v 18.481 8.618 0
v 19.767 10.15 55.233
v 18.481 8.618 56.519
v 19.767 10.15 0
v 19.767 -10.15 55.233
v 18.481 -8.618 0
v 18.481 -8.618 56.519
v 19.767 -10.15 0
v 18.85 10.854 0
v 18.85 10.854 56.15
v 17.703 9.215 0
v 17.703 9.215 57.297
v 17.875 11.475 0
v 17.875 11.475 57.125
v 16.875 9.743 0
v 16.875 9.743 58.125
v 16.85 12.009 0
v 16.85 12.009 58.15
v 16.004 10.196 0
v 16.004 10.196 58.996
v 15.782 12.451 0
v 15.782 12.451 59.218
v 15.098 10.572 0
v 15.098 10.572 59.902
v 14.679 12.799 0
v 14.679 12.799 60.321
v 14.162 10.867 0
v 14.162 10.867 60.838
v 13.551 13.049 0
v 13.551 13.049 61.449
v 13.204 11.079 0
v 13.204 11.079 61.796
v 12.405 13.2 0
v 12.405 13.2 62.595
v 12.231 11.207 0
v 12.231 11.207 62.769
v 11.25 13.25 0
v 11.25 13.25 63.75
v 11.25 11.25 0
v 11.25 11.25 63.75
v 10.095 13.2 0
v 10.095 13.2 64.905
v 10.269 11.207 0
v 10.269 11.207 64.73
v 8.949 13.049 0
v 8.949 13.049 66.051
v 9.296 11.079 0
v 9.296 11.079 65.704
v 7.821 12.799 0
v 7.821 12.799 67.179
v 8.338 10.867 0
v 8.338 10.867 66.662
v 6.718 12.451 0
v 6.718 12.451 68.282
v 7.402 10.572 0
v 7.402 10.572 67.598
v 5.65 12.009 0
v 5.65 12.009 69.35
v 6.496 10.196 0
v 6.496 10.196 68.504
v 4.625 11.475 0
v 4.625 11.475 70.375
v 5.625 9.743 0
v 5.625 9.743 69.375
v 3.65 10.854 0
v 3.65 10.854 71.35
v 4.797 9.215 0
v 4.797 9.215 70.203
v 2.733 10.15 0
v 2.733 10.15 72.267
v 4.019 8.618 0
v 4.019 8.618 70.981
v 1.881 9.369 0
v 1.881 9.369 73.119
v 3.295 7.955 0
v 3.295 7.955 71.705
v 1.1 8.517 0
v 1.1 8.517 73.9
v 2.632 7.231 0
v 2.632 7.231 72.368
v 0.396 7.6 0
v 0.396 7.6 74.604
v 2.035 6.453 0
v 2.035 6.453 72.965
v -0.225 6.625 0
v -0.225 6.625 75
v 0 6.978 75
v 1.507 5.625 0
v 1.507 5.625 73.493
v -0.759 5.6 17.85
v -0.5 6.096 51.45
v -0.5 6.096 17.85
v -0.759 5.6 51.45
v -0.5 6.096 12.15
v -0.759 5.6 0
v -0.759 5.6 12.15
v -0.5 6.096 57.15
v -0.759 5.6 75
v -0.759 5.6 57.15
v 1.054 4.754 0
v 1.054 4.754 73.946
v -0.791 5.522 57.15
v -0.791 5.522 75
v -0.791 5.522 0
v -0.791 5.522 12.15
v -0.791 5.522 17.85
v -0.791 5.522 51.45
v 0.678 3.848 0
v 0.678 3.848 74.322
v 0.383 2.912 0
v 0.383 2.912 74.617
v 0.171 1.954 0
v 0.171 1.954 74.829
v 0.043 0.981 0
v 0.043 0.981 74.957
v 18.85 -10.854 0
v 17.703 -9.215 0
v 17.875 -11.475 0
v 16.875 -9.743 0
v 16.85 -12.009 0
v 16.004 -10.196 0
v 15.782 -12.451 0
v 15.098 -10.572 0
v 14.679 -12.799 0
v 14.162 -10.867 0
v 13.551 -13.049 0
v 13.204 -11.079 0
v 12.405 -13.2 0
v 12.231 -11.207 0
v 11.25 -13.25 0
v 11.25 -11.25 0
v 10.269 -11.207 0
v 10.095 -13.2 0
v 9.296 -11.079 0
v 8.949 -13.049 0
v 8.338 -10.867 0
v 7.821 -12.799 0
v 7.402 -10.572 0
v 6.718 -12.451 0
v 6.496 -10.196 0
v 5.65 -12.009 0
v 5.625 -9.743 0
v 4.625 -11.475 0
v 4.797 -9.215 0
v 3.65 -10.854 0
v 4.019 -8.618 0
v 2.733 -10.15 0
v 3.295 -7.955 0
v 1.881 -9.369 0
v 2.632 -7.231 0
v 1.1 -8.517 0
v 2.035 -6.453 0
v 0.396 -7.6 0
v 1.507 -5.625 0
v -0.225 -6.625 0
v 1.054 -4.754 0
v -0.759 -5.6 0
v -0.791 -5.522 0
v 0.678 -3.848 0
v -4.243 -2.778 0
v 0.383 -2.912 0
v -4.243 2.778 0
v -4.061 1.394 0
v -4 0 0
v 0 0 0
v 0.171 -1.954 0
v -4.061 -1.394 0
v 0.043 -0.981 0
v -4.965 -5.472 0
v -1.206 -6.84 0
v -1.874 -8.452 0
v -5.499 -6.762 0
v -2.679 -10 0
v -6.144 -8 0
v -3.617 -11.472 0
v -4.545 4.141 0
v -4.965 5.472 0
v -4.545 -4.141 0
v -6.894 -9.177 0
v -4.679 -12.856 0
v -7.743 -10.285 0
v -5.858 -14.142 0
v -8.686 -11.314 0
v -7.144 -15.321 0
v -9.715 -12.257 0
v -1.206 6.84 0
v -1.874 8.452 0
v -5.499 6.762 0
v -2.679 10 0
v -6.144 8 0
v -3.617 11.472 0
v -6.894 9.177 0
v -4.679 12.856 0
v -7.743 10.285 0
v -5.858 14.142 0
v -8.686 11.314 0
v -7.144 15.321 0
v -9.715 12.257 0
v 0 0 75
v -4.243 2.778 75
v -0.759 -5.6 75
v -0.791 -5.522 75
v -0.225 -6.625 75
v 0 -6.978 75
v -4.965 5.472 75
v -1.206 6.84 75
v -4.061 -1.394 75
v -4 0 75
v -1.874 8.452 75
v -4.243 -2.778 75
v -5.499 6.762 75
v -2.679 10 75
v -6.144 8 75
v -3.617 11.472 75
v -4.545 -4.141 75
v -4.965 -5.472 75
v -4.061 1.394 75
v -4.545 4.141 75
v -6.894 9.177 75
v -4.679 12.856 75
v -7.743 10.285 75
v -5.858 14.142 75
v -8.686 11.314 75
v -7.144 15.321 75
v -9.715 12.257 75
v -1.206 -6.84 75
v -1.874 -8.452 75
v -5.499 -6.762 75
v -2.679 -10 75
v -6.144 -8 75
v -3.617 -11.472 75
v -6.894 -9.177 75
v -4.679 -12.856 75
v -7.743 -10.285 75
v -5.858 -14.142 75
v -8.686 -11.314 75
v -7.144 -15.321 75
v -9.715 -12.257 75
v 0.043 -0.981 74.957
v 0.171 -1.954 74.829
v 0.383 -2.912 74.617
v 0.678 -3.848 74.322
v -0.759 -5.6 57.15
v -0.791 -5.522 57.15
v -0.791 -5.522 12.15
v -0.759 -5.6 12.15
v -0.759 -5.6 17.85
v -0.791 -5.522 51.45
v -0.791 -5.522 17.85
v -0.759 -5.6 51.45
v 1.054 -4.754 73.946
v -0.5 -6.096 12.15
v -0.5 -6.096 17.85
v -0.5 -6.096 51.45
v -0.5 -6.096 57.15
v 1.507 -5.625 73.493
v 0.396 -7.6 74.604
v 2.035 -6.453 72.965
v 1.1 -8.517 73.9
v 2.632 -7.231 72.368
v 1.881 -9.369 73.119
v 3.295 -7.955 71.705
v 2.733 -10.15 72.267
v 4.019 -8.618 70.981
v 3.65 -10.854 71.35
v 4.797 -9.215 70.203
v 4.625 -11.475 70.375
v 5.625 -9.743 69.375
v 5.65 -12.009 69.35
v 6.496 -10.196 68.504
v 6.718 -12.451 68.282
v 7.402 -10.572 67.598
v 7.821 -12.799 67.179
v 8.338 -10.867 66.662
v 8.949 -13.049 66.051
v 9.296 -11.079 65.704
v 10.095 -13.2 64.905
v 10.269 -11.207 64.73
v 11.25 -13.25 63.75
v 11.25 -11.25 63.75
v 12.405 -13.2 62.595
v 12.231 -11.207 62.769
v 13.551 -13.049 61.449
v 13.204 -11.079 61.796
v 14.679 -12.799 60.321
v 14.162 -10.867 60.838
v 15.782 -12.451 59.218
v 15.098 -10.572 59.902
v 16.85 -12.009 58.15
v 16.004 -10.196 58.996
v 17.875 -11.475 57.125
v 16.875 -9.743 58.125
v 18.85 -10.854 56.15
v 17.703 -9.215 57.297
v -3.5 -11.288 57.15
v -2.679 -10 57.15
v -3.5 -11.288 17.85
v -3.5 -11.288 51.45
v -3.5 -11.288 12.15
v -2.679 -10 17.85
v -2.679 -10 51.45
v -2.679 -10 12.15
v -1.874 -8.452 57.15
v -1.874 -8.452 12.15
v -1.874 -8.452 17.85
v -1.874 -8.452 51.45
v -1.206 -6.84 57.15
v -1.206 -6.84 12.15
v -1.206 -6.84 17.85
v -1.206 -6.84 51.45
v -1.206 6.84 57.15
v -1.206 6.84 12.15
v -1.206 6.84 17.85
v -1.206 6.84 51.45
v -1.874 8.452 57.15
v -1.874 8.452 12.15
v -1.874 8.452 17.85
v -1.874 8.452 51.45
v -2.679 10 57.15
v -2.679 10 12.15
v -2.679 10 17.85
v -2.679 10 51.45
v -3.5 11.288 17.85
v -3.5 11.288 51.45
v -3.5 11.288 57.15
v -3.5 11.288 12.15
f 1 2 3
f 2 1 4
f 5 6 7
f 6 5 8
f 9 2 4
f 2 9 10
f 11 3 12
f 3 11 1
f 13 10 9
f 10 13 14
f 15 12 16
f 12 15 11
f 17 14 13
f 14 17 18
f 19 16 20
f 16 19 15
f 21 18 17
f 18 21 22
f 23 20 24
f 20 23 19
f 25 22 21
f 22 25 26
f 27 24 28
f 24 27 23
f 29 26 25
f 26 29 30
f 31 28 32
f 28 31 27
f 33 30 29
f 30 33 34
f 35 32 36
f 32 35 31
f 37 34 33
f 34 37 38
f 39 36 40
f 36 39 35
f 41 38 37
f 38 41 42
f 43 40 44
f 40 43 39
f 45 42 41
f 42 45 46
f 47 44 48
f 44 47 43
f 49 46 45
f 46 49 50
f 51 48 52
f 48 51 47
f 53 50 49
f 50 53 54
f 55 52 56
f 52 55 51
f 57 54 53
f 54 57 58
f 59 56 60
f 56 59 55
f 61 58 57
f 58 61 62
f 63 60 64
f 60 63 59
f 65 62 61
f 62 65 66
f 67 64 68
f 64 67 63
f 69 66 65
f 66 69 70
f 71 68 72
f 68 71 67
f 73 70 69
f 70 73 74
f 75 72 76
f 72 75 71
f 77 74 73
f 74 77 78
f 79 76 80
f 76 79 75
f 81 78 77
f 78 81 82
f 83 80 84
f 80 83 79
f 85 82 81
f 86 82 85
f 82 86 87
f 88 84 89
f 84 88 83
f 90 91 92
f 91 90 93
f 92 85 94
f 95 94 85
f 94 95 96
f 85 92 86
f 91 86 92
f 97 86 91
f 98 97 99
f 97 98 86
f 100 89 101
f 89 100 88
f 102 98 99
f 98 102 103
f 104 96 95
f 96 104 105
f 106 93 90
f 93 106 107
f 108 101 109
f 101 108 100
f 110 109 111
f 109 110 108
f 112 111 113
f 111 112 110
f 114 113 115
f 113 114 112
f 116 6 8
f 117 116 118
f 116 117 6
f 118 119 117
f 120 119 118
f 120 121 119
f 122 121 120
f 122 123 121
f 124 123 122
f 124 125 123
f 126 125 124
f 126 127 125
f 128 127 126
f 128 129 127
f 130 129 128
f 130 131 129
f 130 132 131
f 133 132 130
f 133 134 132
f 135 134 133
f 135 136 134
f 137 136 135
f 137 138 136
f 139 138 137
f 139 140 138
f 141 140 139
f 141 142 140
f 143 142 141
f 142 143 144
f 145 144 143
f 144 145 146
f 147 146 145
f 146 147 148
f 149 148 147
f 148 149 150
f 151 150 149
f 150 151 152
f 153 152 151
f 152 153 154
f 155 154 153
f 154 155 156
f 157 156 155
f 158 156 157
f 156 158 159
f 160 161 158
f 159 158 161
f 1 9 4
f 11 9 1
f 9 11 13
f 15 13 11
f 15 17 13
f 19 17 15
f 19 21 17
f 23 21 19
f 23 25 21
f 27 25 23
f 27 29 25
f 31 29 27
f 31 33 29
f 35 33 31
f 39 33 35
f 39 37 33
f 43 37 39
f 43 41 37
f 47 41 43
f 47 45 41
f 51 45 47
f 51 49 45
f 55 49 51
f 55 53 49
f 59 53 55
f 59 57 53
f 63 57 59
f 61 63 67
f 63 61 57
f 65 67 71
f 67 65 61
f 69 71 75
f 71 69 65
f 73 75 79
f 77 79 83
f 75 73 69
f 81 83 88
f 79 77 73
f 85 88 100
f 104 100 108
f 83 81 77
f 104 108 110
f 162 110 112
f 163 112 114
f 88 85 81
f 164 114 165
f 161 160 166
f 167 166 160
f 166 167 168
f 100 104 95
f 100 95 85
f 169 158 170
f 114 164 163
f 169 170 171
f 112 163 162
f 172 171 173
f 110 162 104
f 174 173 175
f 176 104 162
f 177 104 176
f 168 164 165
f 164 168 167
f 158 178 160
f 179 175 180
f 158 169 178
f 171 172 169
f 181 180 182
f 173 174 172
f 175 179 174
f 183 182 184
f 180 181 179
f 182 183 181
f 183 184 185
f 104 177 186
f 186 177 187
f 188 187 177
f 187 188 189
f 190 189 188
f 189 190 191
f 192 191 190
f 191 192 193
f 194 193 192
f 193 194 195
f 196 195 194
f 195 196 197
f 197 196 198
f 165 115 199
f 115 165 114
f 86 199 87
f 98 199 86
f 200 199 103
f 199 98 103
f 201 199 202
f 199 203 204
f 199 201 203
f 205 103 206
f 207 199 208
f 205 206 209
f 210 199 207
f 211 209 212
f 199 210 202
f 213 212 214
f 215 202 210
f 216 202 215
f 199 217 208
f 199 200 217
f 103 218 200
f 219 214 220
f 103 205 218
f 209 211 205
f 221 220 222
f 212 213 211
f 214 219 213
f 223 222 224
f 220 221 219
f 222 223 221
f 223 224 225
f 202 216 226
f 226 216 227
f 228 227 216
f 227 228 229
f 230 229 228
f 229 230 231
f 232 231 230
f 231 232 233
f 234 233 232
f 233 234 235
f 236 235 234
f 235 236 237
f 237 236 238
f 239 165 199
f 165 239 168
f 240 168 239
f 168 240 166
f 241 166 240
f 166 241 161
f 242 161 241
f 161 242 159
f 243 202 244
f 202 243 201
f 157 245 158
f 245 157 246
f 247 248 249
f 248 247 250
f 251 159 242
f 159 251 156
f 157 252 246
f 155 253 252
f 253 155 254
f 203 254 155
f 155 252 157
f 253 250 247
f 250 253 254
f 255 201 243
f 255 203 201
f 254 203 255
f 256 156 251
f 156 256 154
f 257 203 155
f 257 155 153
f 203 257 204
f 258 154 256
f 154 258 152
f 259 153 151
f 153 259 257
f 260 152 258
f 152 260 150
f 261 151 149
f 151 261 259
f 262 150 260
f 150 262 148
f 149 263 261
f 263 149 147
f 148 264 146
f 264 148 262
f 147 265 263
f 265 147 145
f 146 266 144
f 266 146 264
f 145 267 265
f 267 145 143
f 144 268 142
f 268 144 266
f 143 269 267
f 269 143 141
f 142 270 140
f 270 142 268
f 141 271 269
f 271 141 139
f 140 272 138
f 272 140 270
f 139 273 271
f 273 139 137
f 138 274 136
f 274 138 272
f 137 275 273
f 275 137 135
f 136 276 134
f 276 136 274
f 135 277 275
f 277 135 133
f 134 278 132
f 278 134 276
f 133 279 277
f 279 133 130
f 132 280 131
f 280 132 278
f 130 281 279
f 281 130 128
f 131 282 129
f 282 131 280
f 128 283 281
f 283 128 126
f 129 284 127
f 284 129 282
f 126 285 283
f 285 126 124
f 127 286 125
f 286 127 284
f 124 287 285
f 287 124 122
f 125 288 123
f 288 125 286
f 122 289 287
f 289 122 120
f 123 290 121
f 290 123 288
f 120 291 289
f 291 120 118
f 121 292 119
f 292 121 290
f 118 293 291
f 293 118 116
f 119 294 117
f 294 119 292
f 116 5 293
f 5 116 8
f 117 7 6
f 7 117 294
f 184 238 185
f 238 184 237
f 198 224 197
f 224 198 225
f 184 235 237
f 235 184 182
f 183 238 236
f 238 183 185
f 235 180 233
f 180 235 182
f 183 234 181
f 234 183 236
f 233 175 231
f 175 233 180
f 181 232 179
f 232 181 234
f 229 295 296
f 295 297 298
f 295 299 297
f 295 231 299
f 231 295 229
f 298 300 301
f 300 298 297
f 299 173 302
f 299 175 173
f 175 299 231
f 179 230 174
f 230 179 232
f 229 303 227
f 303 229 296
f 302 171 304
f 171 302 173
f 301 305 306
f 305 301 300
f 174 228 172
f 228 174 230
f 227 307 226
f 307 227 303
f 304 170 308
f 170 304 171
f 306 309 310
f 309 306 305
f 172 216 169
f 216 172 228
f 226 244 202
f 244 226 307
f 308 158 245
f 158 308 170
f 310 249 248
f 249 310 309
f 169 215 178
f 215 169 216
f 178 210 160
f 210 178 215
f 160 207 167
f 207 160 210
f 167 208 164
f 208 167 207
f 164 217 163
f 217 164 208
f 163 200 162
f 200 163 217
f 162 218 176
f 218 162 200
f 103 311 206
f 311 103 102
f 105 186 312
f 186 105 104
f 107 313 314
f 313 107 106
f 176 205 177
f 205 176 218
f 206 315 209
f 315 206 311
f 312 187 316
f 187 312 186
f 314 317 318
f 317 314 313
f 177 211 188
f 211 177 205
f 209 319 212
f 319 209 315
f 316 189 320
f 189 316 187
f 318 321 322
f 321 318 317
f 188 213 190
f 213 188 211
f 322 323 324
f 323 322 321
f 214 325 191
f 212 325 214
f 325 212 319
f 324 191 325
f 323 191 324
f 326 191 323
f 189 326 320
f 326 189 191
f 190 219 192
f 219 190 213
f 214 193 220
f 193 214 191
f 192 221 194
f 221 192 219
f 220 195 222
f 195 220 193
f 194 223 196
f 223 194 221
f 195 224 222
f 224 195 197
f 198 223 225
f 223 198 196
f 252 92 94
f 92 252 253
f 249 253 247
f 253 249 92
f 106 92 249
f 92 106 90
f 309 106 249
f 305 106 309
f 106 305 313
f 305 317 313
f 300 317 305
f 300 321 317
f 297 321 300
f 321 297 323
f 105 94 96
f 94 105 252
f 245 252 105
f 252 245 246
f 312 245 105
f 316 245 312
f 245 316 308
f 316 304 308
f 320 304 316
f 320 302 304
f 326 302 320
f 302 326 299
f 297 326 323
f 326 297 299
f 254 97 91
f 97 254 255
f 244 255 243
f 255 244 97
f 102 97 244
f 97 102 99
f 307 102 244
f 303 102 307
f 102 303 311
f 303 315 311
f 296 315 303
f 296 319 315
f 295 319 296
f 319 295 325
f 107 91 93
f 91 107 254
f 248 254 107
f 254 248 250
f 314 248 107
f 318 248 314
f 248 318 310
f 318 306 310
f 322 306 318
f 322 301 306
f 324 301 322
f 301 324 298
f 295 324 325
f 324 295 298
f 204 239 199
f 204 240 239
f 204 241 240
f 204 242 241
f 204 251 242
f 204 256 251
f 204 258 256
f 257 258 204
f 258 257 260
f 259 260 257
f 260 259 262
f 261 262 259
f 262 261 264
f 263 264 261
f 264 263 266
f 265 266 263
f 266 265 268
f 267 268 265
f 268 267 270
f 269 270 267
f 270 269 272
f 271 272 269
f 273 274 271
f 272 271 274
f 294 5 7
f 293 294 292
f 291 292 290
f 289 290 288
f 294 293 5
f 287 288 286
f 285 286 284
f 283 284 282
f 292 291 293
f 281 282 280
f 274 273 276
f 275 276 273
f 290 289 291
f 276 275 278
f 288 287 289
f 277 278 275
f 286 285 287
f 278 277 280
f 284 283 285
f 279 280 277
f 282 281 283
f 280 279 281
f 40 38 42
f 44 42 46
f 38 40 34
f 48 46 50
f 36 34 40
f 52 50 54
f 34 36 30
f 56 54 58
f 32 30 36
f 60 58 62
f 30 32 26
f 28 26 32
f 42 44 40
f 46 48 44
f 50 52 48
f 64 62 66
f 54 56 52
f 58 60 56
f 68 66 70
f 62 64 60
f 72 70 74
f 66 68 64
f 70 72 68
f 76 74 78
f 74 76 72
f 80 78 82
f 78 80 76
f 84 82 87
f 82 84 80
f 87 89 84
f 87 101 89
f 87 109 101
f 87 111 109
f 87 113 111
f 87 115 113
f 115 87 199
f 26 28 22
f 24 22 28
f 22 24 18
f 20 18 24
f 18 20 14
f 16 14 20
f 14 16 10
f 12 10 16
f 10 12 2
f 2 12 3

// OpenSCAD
height = 75;
pumpDiameter = 26;
pumpOpeningAngle = 100;
pumpWallThickness = 2;
tubeDiameter =  32; 
tubeOpeningAngle = 260;
tubeWallThickness = 4;

topHolderHeight = 45; 
cinch = 3.5;
topSlit = 4;
zipTieHoleHeight = 5.7;
zipTieHoleWidth = 3;
plasticSavingHoleHeightRatio = 0.72;

module dummy() {}

nudge = 0.01;
$fn = 72;

module cyl(id,wall,openingAngle,height) {
    difference() {
        rotate([0,0,openingAngle/2])
        rotate_extrude(angle=360-openingAngle) {
            translate([id/2,0]) square([wall,height]);
        }
        
    }
}

module main() {
    translate([(pumpDiameter-cinch)/2,0,0])
    cyl(pumpDiameter-cinch,pumpWallThickness,pumpOpeningAngle,height);
    translate([-tubeDiameter/2-tubeWallThickness,0,0])
    rotate([0,0,180]) cyl(tubeDiameter,tubeWallThickness,tubeOpeningAngle,height);
}

difference() {
    main();
    for (h=[ height * 0.2 , height * .8 - zipTieHoleHeight ])
    translate([-tubeWallThickness/2,0,h])
    cube([zipTieHoleWidth,100,zipTieHoleHeight], center=true);
    translate([0,-50,height])
    rotate([0,45,0]) cube(100);
    
}
